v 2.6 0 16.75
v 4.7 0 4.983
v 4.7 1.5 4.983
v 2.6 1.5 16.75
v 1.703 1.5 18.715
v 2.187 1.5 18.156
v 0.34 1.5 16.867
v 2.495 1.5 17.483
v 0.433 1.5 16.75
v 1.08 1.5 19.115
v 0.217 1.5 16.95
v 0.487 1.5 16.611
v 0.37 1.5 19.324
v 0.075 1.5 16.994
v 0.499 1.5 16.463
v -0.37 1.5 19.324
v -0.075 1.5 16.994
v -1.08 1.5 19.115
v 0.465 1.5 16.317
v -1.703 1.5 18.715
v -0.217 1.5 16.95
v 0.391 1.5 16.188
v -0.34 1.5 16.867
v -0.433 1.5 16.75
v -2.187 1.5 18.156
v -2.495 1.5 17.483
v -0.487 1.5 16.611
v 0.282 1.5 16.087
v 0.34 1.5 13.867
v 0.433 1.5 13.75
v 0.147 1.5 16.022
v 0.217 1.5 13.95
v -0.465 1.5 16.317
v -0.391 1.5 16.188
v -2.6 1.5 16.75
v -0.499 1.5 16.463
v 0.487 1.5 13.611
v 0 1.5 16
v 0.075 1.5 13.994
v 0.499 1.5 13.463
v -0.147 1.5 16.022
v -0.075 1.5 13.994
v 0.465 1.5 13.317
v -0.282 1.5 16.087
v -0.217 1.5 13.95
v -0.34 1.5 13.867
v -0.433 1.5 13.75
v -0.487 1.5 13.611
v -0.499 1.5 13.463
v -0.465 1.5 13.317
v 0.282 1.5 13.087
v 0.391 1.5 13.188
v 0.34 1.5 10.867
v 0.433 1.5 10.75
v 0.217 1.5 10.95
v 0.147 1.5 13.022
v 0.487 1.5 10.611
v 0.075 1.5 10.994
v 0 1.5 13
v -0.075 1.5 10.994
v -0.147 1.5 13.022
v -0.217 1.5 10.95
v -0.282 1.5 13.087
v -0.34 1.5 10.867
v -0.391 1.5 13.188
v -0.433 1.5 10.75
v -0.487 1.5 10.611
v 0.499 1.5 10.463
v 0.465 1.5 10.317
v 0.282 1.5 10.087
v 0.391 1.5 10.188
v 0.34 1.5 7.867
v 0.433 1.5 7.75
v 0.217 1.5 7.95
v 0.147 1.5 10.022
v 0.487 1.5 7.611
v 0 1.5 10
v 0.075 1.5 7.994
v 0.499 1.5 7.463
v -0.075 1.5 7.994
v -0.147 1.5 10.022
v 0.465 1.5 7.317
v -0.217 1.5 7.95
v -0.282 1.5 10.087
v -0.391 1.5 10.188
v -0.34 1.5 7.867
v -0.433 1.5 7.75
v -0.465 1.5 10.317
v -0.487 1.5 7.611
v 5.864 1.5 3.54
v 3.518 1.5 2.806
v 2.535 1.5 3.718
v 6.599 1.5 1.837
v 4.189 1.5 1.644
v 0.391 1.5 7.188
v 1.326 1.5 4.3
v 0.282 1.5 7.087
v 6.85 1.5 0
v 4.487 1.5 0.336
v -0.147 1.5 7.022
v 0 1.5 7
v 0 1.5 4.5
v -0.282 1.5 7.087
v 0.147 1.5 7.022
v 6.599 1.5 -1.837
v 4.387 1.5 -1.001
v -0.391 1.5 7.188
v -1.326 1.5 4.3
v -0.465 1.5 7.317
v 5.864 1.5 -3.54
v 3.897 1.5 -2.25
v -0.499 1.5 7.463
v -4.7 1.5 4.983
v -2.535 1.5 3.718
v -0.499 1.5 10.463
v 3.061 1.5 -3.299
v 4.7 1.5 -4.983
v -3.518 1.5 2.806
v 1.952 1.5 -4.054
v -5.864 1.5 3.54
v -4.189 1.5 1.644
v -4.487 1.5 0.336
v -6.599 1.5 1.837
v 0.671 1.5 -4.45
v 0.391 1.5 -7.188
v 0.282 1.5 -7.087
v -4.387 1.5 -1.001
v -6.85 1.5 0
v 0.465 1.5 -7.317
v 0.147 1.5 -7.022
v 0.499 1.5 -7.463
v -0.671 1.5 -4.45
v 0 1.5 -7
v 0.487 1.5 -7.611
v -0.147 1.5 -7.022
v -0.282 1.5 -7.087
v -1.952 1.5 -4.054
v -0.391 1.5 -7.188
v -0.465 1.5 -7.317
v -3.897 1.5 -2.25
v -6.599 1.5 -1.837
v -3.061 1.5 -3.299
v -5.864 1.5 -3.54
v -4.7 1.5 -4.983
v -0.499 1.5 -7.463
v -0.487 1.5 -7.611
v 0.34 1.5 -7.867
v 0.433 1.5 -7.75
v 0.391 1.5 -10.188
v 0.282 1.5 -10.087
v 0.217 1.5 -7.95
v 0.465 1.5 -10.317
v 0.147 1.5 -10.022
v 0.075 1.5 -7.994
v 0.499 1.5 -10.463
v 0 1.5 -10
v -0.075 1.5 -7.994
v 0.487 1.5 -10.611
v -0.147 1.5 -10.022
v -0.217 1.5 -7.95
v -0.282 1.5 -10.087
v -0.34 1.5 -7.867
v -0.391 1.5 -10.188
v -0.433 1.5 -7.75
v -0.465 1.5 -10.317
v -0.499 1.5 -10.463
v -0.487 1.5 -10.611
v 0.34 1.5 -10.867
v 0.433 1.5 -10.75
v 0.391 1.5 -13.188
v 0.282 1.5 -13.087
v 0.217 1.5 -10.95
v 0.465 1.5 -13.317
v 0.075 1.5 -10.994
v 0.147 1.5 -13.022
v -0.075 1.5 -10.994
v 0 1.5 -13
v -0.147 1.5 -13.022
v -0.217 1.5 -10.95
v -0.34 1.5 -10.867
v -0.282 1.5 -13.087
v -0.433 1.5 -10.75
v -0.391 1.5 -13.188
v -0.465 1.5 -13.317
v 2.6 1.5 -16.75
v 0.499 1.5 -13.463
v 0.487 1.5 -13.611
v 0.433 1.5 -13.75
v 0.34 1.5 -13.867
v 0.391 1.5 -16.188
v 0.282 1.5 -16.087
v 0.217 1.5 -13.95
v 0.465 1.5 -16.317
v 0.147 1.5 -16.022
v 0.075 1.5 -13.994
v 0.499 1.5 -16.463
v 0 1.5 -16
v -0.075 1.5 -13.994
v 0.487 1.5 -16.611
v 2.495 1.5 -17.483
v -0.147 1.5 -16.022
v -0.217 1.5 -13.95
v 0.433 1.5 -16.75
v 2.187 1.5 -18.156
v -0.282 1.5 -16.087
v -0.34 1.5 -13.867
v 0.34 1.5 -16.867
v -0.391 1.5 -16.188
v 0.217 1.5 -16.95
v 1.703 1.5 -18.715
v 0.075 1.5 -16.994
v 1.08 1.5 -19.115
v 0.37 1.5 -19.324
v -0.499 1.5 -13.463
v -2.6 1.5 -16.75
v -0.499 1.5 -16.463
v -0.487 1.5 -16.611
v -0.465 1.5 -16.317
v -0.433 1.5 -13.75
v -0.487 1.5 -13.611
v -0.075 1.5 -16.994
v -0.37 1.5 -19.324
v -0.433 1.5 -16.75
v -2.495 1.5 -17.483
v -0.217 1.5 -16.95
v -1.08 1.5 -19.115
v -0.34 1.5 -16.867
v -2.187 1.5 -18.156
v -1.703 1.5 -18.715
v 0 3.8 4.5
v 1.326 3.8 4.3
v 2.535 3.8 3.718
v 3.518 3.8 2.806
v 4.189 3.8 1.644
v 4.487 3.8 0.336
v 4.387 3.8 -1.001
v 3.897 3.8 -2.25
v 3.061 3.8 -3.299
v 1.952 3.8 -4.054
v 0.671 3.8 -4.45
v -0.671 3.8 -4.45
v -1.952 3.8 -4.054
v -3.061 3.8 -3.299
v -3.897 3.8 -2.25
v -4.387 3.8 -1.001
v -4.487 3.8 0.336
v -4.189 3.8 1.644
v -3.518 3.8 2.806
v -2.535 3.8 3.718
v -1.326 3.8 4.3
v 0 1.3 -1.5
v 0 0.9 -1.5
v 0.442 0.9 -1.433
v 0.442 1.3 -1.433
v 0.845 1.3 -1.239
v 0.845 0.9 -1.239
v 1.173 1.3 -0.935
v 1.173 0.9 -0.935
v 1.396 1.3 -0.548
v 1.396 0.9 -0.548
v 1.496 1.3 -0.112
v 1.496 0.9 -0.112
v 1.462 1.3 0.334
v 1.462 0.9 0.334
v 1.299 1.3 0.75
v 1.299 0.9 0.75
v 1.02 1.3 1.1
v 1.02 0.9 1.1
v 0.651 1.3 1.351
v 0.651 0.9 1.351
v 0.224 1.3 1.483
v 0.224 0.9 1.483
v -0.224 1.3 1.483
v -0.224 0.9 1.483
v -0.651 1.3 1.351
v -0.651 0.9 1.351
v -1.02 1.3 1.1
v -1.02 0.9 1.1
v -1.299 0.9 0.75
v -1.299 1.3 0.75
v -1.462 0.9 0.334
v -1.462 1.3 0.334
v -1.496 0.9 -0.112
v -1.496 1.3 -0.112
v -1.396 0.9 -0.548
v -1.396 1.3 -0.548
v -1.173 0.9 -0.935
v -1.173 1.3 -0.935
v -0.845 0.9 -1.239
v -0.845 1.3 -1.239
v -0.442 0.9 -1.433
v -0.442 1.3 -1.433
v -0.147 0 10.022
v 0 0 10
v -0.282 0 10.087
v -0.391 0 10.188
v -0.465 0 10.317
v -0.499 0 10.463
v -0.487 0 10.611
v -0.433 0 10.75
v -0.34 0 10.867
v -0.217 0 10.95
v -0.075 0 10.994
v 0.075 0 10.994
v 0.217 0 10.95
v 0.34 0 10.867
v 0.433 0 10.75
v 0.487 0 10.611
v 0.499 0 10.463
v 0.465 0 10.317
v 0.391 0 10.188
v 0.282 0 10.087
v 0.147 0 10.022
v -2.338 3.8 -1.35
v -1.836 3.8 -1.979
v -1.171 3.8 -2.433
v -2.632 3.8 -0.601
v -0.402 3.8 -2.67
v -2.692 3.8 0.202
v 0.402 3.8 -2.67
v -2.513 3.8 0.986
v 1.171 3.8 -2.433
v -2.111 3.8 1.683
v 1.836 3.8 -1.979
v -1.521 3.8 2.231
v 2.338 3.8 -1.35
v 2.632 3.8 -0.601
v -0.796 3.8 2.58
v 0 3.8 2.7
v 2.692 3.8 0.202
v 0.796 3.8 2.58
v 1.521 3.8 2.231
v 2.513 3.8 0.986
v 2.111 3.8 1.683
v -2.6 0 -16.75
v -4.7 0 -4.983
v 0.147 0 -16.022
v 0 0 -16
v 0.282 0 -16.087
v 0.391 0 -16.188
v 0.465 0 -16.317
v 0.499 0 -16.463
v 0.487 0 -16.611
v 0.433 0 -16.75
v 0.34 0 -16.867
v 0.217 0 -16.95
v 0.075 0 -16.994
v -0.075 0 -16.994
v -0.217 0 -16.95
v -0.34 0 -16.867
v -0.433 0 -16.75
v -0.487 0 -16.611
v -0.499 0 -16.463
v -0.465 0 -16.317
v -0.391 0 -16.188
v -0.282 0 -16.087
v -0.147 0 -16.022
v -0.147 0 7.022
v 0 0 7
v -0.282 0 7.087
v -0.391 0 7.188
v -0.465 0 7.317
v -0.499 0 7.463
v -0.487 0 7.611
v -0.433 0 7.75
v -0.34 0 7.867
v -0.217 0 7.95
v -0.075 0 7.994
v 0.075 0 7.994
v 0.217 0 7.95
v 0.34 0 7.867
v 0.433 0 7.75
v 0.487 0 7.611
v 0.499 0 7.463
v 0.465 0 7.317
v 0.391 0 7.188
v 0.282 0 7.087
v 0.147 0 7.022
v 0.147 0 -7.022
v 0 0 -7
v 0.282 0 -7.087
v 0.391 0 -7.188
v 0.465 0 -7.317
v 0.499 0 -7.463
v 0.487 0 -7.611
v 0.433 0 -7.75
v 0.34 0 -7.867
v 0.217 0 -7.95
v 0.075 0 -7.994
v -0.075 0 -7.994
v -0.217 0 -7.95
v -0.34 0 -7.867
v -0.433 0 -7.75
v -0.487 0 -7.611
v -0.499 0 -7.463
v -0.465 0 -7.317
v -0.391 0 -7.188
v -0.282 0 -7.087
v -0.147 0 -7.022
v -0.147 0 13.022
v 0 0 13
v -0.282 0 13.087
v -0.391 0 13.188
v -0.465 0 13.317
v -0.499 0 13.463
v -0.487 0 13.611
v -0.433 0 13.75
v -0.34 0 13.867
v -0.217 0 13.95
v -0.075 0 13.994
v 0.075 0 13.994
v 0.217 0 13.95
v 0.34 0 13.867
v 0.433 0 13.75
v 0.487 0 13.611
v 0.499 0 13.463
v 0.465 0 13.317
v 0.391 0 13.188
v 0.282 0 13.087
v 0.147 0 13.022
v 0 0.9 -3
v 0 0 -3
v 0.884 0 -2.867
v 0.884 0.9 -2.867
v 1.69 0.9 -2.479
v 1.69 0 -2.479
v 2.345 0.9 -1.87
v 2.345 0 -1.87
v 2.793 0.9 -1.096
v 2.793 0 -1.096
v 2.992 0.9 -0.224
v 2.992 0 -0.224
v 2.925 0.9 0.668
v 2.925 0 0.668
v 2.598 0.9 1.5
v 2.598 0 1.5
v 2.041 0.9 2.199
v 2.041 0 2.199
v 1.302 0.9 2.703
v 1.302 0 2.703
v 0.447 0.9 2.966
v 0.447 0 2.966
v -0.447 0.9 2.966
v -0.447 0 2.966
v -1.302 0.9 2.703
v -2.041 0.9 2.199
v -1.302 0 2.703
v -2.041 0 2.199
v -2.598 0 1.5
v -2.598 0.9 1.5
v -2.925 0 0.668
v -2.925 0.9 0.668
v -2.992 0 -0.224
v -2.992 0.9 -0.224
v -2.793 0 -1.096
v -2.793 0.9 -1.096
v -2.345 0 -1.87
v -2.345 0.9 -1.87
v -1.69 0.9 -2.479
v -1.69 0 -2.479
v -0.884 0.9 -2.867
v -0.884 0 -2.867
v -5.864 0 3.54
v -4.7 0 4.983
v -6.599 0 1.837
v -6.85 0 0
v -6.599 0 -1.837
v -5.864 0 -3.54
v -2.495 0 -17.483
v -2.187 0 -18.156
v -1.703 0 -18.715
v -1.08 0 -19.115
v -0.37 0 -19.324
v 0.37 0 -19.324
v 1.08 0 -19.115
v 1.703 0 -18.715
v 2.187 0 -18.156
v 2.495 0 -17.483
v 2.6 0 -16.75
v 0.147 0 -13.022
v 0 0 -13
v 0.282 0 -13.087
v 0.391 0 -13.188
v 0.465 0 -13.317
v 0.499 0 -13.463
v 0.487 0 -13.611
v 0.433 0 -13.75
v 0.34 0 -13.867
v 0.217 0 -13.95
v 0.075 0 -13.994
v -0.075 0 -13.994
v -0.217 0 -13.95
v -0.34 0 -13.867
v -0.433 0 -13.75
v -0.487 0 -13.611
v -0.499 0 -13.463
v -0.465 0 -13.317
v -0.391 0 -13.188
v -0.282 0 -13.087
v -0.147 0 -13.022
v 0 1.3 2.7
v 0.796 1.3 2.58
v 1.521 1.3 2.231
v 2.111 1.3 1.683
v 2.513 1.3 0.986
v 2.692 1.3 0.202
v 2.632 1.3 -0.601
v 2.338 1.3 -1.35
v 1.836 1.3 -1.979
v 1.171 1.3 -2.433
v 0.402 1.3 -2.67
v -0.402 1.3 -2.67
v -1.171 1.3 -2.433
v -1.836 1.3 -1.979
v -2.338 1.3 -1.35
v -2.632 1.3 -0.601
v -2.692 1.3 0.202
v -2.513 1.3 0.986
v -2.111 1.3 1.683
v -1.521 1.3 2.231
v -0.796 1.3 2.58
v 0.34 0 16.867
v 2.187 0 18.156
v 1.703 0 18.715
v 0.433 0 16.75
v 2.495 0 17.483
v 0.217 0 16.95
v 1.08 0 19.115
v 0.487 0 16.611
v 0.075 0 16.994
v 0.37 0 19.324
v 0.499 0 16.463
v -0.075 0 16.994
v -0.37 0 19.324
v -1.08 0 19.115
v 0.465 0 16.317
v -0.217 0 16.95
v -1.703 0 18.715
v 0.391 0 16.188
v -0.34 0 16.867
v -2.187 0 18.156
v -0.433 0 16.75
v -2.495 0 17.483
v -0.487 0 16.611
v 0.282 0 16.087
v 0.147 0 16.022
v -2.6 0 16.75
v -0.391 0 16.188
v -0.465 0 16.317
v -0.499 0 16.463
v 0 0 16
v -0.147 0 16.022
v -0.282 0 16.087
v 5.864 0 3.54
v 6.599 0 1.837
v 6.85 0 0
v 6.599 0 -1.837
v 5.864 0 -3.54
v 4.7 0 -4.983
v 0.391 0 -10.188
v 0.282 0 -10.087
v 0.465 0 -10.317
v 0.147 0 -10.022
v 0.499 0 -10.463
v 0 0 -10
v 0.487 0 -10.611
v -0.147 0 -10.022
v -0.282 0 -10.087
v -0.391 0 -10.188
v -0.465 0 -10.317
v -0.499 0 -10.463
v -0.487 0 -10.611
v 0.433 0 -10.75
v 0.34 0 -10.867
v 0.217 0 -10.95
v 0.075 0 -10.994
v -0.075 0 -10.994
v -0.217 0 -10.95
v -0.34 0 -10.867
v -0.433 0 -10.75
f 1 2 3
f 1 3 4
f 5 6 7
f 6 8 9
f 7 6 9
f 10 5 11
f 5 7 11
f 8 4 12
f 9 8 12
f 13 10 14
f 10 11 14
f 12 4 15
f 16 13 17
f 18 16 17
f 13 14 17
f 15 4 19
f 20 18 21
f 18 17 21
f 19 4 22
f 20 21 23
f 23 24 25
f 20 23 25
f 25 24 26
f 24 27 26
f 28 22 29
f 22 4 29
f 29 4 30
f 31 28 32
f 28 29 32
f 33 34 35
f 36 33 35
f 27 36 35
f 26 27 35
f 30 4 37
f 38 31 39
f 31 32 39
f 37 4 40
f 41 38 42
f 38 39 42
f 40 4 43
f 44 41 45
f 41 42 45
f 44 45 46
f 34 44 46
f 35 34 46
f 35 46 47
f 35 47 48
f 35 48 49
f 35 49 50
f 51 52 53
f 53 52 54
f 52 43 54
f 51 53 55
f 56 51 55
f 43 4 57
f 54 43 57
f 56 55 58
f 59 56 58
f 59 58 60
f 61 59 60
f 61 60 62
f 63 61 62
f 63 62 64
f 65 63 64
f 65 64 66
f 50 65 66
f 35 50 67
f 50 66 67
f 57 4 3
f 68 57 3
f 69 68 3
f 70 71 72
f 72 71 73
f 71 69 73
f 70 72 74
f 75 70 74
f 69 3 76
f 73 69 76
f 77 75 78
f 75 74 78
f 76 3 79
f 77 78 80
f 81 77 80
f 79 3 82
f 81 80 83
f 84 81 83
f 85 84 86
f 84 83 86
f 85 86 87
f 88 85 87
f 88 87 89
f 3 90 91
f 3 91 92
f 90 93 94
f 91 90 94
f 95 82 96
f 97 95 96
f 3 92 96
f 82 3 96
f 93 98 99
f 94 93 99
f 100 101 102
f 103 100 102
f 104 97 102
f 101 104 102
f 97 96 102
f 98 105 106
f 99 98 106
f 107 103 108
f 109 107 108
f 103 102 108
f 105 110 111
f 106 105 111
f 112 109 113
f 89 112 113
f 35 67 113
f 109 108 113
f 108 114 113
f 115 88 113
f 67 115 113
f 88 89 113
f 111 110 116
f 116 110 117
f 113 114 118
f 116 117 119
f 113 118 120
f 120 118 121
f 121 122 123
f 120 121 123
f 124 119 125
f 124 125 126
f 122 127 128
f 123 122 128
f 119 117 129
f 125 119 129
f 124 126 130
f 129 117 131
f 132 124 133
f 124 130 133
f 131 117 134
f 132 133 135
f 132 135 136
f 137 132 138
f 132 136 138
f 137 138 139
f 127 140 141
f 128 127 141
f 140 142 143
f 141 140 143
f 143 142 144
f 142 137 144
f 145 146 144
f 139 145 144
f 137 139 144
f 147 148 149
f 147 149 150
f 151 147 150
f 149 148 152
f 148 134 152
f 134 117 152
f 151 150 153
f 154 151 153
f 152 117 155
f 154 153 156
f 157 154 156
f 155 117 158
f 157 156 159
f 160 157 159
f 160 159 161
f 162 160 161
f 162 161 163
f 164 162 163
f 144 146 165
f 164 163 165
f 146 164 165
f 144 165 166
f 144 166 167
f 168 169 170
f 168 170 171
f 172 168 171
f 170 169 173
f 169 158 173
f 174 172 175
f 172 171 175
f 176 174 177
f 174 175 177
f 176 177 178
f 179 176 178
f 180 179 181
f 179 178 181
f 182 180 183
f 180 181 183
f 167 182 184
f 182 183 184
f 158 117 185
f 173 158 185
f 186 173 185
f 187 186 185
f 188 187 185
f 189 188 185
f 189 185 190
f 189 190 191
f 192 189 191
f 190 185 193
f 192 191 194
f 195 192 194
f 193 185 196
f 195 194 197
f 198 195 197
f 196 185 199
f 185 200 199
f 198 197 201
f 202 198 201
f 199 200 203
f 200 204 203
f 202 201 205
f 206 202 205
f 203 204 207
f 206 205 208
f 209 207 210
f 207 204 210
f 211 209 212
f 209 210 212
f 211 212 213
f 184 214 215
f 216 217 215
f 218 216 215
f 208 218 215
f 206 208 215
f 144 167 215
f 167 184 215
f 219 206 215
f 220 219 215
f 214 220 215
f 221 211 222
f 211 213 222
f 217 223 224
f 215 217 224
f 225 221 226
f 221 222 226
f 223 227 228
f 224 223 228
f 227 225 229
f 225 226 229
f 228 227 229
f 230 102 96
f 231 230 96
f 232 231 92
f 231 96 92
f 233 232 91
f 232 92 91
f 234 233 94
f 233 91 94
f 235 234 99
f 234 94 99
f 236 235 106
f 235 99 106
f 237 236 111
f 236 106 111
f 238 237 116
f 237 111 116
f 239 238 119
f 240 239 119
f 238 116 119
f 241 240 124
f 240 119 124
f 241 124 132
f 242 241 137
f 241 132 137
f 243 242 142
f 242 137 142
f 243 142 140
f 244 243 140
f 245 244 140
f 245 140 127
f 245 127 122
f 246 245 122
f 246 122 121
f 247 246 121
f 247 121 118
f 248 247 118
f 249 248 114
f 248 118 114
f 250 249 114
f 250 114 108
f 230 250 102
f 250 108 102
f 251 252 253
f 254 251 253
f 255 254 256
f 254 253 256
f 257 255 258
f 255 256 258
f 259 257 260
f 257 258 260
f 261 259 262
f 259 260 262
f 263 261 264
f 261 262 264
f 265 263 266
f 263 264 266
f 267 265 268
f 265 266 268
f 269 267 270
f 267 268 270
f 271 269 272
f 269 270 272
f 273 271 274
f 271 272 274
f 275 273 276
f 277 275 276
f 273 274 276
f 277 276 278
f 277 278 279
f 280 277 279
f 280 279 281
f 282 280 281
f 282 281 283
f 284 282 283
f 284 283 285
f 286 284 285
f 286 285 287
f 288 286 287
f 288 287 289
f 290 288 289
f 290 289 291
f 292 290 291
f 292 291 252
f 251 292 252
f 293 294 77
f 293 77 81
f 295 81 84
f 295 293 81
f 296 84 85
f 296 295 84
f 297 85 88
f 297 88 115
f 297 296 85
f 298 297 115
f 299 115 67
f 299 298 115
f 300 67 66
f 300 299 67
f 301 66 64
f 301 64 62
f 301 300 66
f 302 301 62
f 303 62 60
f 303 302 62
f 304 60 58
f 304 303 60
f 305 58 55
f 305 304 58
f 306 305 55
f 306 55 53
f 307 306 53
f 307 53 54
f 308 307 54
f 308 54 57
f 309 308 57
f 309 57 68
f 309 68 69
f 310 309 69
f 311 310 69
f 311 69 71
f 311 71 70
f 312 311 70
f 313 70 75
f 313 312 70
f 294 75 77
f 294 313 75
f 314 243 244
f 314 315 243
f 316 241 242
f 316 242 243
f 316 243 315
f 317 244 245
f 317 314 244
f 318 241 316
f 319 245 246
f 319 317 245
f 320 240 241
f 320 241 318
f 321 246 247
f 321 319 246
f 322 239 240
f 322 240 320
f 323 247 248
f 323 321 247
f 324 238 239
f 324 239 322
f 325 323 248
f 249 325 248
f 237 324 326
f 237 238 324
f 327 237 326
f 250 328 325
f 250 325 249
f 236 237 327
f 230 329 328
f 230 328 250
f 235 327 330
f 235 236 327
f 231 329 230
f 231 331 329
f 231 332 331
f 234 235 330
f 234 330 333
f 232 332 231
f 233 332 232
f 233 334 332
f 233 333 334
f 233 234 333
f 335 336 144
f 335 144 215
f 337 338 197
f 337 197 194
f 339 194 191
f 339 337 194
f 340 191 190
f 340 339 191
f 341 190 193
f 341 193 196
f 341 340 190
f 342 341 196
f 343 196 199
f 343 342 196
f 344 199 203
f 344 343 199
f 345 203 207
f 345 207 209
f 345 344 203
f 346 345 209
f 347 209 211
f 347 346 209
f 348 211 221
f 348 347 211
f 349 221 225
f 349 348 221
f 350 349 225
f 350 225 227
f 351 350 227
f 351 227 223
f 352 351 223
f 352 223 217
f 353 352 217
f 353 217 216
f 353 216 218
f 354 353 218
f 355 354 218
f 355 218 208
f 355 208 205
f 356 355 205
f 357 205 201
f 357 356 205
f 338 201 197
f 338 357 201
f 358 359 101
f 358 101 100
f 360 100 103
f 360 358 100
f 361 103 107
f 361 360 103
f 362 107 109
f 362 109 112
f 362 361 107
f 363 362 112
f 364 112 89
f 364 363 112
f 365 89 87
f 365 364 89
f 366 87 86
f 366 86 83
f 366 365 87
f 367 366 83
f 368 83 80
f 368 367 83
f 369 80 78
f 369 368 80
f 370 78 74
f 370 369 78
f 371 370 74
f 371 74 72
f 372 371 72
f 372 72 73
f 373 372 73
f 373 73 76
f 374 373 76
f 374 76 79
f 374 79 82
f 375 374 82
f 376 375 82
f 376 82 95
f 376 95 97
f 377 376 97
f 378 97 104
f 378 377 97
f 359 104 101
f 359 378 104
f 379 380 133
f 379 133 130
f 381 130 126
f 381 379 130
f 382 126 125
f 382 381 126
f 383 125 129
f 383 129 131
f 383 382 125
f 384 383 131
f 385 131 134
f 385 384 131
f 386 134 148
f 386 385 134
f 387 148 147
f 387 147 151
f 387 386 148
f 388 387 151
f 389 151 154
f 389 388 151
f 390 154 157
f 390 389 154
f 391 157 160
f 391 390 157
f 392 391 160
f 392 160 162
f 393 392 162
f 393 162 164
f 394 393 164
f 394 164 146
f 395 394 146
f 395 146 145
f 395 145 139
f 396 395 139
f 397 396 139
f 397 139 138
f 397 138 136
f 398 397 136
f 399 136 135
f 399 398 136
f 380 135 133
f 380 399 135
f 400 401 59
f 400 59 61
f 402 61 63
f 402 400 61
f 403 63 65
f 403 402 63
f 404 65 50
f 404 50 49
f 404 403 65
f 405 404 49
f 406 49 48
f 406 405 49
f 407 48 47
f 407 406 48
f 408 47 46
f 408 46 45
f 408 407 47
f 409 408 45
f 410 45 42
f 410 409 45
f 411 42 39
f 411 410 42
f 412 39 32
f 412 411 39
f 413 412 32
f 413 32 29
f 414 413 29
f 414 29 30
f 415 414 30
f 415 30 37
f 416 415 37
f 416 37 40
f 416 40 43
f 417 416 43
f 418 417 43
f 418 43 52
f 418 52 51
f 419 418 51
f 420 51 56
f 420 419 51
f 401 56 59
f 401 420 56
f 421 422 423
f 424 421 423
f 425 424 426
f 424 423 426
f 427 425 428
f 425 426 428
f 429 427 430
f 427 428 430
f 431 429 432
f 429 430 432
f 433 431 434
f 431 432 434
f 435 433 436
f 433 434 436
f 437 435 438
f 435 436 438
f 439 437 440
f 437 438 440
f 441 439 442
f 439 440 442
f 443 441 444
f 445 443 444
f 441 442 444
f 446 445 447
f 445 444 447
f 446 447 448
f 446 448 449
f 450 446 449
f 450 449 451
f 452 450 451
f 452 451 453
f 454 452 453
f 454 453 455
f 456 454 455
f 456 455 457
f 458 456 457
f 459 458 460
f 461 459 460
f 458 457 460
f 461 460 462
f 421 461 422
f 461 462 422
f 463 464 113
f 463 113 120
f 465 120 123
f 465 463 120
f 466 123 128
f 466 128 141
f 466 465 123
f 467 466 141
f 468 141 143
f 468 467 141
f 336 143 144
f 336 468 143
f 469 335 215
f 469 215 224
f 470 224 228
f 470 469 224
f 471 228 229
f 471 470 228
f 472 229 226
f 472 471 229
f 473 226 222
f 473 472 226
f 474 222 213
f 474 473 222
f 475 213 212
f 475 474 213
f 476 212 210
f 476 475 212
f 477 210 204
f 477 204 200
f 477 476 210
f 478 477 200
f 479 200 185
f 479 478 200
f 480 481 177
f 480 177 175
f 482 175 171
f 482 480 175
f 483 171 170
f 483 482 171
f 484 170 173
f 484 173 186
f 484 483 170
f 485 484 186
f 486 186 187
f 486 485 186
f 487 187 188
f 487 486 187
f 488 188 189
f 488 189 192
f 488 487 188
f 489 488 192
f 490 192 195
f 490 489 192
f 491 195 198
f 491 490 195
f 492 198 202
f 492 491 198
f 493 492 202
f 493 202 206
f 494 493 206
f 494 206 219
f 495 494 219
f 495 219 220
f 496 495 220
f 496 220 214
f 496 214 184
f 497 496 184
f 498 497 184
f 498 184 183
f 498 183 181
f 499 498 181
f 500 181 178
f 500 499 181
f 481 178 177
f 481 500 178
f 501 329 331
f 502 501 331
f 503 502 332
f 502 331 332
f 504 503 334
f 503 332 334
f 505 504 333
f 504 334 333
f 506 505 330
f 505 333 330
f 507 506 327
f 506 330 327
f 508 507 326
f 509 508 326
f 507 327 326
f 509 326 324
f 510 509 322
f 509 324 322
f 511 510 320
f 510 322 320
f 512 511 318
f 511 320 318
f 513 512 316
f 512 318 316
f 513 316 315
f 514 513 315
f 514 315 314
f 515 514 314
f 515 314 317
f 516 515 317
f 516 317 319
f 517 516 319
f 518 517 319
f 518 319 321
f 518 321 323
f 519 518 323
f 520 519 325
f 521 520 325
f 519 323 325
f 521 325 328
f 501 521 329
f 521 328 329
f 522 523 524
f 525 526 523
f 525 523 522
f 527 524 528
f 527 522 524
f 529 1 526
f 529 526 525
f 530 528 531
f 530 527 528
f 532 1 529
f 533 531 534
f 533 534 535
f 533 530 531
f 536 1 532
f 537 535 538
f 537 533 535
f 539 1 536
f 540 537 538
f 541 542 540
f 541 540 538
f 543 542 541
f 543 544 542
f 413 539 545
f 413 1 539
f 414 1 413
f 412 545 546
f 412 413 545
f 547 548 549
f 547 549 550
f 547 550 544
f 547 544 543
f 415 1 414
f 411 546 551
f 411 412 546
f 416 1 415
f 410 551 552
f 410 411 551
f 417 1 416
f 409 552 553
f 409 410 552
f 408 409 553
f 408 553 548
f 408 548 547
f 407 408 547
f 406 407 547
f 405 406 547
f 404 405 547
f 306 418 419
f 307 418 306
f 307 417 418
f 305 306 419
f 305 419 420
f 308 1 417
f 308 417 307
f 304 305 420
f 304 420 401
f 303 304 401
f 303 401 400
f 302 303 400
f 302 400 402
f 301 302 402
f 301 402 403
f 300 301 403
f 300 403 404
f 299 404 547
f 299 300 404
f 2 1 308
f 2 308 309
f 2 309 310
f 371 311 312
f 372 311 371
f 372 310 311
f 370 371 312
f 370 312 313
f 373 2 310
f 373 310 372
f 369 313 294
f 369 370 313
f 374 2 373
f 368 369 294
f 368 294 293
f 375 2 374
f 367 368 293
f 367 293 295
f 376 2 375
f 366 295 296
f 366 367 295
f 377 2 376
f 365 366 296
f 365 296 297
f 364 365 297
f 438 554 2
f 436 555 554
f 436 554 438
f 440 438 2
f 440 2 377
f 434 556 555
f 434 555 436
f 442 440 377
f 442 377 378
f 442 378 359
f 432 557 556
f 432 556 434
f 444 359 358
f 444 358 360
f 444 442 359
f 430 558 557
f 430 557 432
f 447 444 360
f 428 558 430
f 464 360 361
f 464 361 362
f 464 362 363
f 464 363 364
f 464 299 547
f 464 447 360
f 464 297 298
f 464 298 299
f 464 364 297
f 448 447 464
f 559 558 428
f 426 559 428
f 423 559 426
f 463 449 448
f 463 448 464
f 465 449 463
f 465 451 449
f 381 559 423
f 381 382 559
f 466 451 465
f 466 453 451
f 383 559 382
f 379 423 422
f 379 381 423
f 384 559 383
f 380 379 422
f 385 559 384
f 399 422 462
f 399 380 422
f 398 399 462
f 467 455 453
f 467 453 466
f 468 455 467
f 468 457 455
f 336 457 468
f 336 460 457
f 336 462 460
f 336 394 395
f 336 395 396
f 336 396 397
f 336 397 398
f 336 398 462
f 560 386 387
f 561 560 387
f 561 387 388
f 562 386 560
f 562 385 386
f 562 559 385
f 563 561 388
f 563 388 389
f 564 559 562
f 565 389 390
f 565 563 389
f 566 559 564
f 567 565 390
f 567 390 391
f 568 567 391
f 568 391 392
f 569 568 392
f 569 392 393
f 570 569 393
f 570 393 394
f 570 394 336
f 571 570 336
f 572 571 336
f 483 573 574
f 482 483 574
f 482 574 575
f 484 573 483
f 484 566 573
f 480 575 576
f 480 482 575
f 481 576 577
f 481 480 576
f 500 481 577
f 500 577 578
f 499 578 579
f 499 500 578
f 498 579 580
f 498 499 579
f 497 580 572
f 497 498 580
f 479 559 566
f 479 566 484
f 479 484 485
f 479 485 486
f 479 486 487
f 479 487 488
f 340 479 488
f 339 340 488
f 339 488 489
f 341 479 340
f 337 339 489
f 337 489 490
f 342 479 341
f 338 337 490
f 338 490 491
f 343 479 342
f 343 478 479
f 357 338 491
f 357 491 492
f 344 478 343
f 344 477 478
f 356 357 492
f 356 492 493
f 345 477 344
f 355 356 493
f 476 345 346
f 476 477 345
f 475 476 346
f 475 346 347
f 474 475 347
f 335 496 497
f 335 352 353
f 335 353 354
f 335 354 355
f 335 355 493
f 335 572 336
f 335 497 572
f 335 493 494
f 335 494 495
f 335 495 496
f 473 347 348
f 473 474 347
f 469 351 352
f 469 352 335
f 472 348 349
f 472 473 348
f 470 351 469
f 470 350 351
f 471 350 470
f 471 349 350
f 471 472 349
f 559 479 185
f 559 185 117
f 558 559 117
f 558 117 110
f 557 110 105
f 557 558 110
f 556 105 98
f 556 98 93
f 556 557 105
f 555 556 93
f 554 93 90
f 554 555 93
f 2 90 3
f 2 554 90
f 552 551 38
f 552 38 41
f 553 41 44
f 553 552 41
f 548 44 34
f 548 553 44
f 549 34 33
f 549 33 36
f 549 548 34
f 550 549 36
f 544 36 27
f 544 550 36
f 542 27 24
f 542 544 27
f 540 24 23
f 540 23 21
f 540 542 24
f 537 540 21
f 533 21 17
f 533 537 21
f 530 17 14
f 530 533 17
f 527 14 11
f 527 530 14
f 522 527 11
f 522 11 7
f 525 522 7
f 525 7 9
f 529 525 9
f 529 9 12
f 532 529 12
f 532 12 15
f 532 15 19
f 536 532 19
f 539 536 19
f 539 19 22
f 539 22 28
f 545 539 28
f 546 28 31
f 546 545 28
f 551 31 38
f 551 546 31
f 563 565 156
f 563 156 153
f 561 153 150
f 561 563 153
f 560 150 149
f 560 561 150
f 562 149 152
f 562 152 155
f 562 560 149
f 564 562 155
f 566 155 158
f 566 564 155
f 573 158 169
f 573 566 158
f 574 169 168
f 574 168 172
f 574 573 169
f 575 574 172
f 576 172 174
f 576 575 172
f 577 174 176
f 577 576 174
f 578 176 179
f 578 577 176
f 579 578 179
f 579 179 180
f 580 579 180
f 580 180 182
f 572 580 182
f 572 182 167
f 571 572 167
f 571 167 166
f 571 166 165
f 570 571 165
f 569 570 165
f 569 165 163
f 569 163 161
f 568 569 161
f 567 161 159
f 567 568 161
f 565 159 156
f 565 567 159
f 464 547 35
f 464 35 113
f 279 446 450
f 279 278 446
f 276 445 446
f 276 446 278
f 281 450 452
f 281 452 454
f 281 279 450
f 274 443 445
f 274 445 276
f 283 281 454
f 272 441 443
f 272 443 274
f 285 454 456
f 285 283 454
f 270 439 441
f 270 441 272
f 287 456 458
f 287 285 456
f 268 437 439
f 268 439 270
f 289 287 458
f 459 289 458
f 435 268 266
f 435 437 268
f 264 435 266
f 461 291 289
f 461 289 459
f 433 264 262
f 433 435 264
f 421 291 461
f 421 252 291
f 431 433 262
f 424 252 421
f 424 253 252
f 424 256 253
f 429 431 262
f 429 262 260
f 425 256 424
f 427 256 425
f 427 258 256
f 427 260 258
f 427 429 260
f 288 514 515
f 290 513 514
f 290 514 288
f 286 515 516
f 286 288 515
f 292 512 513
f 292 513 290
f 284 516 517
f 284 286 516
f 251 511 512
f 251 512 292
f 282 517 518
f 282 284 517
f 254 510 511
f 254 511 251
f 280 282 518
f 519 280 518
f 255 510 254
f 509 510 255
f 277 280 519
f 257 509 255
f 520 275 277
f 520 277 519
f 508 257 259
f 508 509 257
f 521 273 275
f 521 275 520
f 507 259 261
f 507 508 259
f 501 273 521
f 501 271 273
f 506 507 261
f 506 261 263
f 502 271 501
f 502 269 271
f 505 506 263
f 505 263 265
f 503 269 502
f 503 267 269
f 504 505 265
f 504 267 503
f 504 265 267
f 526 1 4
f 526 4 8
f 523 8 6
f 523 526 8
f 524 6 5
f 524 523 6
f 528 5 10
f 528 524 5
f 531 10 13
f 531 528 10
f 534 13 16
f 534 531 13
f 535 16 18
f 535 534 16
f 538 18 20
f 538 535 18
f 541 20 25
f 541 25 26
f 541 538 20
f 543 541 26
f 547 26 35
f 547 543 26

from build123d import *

# Parameters (mm, degrees)
CROQUIS2_R              = 0.5
SALIENTE_EXTRUIR1_DEPTH = 1.5
CROQUIS3_R              = 4.5
SALIENTE_EXTRUIR2_DEPTH = 2.3
CROQUIS4_R              = 3
CORTAR_EXTRUIR1_DEPTH   = 0.9
CROQUIS5_R              = 1.5
CORTAR_EXTRUIR2_DEPTH   = 21.730533037
CROQUIS6_R              = 2.7
CORTAR_EXTRUIR3_DEPTH   = 2.5


with BuildPart() as part:
    # Croquis2 → Saliente-Extruir1 (new body)
    with BuildSketch(Plane(origin=(0, 0, 0), x_dir=(1, 0, 0), z_dir=(0, 1, 0))):
        with BuildLine():
            Line((2.6, 16.75), (4.7, 4.983221849))
            ThreePointArc((4.7, 4.983221849), (6.85, 0), (4.7, -4.983221849))
            Line((4.7, -4.983221849), (2.6, -16.75))
            ThreePointArc((2.6, -16.75), (0, -19.35), (-2.6, -16.75))
            Line((-2.6, -16.75), (-4.7, -4.983221849))
            ThreePointArc((-4.7, -4.983221849), (-6.85, 0), (-4.7, 4.983221849))
            Line((-4.7, 4.983221849), (-2.6, 16.75))
            ThreePointArc((-2.6, 16.75), (0, 19.35), (2.6, 16.75))
        make_face()
        with Locations(Location((0, -16.5, 0), (0, 0, 90))):
            Circle(CROQUIS2_R, mode=Mode.SUBTRACT)
        with Locations(Location((0, -13.5, 0), (0, 0, 90))):
            Circle(CROQUIS2_R, mode=Mode.SUBTRACT)
        with Locations(Location((0, -10.5, 0), (0, 0, 90))):
            Circle(CROQUIS2_R, mode=Mode.SUBTRACT)
        with Locations(Location((0, -7.5, 0), (0, 0, 90))):
            Circle(CROQUIS2_R, mode=Mode.SUBTRACT)
        with Locations(Location((0, 7.5, 0), (0, 0, 270))):
            Circle(CROQUIS2_R, mode=Mode.SUBTRACT)
        with Locations(Location((0, 10.5, 0), (0, 0, 270))):
            Circle(CROQUIS2_R, mode=Mode.SUBTRACT)
        with Locations(Location((0, 13.5, 0), (0, 0, 270))):
            Circle(CROQUIS2_R, mode=Mode.SUBTRACT)
        with Locations(Location((0, 16.5, 0), (0, 0, 270))):
            Circle(CROQUIS2_R, mode=Mode.SUBTRACT)
    extrude(amount=SALIENTE_EXTRUIR1_DEPTH)

    # Croquis3 → Saliente-Extruir2 (add)
    with BuildSketch(Plane(origin=(0, 1.5, 0), x_dir=(1, 0, 0), z_dir=(0, 1, 0))):
        with Locations(Location((0, 0, 0), (0, 0, 270))):
            Circle(CROQUIS3_R)
    extrude(amount=SALIENTE_EXTRUIR2_DEPTH)

    # Croquis4 → Cortar-Extruir1 (cut)
    with BuildSketch(Plane.XZ):
        with Locations(Location((0, 0, 0), (0, 0, 270))):
            Circle(CROQUIS4_R)
    extrude(amount=-CORTAR_EXTRUIR1_DEPTH, mode=Mode.SUBTRACT)

    # Croquis5 → Cortar-Extruir2 (cut, through all)
    with BuildSketch(Plane.XZ.offset(-0.9)):
        with Locations(Location((0, 0, 0), (0, 0, 270))):
            Circle(CROQUIS5_R)
    extrude(amount=-CORTAR_EXTRUIR2_DEPTH, mode=Mode.SUBTRACT)

    # Croquis6 → Cortar-Extruir3 (cut)
    with BuildSketch(Plane(origin=(0, 3.8, 0), x_dir=(1, 0, 0), z_dir=(0, 1, 0))):
        with Locations(Location((0, 0, 0), (0, 0, 270))):
            Circle(CROQUIS6_R)
    extrude(amount=-CORTAR_EXTRUIR3_DEPTH, mode=Mode.SUBTRACT)


solid = part.part
